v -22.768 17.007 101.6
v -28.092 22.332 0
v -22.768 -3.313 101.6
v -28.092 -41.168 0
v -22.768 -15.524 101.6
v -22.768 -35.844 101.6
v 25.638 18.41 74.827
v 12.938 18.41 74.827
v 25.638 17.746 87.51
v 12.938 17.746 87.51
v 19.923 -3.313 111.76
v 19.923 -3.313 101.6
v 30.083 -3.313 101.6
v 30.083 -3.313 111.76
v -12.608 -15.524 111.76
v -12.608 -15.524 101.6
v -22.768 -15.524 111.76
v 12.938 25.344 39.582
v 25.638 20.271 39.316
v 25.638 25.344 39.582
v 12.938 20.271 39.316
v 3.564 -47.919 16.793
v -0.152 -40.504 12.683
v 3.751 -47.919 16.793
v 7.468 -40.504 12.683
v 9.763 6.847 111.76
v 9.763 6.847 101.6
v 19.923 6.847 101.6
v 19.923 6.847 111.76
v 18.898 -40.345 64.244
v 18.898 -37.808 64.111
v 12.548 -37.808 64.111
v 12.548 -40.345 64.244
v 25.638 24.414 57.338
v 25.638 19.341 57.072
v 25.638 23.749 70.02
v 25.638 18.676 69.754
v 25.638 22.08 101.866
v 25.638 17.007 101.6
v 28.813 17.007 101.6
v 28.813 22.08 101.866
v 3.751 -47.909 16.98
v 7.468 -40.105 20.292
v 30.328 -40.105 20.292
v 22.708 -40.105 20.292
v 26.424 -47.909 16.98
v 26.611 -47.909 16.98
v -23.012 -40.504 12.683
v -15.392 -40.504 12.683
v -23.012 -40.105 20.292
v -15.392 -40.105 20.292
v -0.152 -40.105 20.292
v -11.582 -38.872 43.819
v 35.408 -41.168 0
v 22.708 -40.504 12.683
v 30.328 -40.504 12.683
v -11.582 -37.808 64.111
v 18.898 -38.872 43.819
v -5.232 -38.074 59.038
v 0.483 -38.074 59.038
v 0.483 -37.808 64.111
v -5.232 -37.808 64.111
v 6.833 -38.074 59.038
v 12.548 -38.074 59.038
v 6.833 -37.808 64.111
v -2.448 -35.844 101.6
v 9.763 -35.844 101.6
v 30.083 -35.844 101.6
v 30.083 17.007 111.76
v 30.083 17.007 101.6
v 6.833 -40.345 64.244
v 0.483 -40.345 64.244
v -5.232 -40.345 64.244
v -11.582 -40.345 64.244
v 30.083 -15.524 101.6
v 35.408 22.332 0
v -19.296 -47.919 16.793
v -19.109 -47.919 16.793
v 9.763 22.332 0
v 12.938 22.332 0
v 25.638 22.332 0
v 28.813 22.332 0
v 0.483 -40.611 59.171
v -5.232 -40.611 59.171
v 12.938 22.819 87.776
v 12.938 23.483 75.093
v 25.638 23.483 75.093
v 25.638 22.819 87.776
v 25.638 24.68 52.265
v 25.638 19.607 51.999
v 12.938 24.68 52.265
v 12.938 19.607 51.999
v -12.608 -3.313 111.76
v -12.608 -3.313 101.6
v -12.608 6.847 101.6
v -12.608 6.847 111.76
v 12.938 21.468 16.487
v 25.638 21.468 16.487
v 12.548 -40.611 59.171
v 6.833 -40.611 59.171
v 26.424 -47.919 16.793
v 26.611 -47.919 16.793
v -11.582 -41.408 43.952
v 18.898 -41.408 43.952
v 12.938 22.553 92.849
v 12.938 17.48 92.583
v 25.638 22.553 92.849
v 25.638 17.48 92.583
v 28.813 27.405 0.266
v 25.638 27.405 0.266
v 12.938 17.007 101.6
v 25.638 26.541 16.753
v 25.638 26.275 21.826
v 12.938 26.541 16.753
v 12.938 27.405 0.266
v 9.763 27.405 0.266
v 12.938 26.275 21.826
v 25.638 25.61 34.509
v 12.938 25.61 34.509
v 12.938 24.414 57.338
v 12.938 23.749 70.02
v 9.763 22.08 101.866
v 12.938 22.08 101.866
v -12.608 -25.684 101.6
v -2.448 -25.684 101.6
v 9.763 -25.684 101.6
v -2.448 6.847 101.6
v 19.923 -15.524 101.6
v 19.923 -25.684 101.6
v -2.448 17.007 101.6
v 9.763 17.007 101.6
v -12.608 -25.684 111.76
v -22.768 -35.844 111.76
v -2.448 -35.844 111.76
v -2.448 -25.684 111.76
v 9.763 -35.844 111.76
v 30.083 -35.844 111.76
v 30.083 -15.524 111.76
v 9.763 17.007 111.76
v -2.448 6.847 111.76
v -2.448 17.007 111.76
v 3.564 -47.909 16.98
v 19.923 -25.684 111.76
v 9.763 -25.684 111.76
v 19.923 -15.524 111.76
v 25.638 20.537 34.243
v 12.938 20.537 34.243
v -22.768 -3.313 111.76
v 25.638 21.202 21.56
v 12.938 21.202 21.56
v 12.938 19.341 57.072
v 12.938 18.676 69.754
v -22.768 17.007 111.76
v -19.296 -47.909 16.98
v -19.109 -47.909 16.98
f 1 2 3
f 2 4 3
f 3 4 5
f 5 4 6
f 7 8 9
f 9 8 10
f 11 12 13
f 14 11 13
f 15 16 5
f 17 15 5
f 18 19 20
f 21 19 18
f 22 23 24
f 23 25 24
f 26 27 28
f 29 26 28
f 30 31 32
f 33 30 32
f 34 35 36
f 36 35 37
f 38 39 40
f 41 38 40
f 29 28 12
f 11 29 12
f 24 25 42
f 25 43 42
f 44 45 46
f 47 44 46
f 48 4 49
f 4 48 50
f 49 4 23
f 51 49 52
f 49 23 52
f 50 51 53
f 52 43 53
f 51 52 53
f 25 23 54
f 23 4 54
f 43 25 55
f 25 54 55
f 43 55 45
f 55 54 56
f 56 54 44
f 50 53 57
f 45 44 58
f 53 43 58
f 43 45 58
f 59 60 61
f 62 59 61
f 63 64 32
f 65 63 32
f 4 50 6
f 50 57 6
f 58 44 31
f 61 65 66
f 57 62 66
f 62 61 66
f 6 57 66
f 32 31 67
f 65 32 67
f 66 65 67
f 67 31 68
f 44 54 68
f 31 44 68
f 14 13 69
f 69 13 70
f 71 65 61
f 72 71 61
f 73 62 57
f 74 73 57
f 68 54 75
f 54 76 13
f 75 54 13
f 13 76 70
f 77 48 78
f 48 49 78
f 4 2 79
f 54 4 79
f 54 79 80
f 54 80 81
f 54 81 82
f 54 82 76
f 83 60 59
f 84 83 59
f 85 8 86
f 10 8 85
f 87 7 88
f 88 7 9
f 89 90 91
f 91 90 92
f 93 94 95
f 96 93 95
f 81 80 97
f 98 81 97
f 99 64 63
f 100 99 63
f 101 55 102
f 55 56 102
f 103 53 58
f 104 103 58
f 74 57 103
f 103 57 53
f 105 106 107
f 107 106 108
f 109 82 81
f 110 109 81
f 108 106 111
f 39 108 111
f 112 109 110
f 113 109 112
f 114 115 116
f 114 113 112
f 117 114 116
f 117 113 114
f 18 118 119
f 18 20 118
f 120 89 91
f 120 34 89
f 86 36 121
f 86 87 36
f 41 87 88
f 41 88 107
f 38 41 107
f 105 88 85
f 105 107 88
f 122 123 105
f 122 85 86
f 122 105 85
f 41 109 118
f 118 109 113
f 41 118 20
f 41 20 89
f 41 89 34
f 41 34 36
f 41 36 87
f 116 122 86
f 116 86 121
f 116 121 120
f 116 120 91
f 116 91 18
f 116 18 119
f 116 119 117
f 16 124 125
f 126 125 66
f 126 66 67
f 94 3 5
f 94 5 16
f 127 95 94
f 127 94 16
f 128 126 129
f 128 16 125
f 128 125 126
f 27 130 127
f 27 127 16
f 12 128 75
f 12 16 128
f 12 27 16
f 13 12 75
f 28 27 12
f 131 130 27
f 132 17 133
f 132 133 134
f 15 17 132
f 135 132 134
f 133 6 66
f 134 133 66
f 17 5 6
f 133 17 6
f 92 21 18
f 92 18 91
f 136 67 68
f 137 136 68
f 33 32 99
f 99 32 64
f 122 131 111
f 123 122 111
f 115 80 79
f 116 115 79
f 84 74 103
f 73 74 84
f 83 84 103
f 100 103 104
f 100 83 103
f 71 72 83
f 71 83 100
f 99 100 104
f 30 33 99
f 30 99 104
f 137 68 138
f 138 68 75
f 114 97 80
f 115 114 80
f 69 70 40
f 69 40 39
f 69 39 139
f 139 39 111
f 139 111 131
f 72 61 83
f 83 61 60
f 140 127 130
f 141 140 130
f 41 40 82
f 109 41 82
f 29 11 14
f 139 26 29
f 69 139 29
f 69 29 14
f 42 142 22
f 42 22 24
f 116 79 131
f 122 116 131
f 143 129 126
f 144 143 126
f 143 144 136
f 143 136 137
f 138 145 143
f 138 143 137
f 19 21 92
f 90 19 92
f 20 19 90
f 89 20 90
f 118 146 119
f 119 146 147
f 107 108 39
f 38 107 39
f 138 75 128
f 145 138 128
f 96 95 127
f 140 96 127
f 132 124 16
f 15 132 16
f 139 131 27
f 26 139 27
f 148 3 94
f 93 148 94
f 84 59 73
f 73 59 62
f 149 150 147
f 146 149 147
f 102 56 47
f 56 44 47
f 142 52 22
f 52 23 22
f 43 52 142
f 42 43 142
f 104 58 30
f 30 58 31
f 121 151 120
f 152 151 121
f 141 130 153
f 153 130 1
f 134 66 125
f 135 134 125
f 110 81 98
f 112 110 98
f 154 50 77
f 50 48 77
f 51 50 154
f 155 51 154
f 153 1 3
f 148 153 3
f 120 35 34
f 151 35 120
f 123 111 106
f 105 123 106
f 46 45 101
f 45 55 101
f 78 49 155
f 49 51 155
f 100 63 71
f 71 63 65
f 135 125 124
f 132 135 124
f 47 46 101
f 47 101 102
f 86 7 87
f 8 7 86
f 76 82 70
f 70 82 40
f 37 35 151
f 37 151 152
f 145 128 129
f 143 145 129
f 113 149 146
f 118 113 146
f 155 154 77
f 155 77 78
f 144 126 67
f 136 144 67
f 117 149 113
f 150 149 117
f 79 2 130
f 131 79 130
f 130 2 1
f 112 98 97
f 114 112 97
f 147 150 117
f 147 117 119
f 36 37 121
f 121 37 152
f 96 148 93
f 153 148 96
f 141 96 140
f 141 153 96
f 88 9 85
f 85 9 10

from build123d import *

# Parameters (mm, degrees)
F0_W     = 63.5
F0_H     = 63.5
F1_DEPTH = 101.6
F1_TAPER = 3
F3_DEPTH = 10.16
F4_W     = 7.62
F4_H     = 7.62
F5_DEPTH = 7.62
F5_TAPER = 26
F7_DEPTH = 2.54
F8_W     = 12.7
F8_H     = 12.7
F9_DEPTH = 5.08


with BuildPart() as f1:
    # F0 (on Top) → F1 (new body)
    with BuildSketch(Plane.XY):
        with Locations((3.6575980484, -9.4182148212)):
            Rectangle(F0_W, F0_H)
    extrude(amount=F1_DEPTH, taper=F1_TAPER)

    # F2 (on face) → F3 (join)
    with BuildSketch(Plane.XY.offset(101.6)):
        Polygon((-12.6077715764, -15.5235844461), (-22.7677715764, -15.5235844461), (-22.7677715764, -35.8435844461), (-12.6077715764, -35.8435844461), (-2.4477715764, -35.8435844461), (-2.4477715764, -25.6835844461), (-12.6077715764, -25.6835844461), align=None)
        Polygon((19.9229676733, -35.8435844461), (30.0829676733, -35.8435844461), (30.0829676733, -15.5235844461), (19.9229676733, -15.5235844461), (19.9229676733, -25.6835844461), (9.7629676733, -25.6835844461), (9.7629676733, -35.8435844461), align=None)
        Polygon((-12.6077715764, 17.0071548036), (-22.7677715764, 17.0071548036), (-22.7677715764, -3.3128451964), (-12.6077715764, -3.3128451964), (-12.6077715764, 6.8471548036), (-2.4477715764, 6.8471548036), (-2.4477715764, 17.0071548036), align=None)
        Polygon((30.0829676733, -3.3128451964), (30.0829676733, 17.0071548036), (19.9229676733, 17.0071548036), (9.7629676733, 17.0071548036), (9.7629676733, 6.8471548036), (19.9229676733, 6.8471548036), (19.9229676733, -3.3128451964), align=None)
    extrude(amount=F3_DEPTH)

    # F4 (on face) → F5 (join)
    with BuildSketch(Plane(origin=(0, -41.0554529271, 2.1516251154), x_dir=(1, 0, 0), z_dir=(0, -0.9986295348, 0.0523359562))):
        with Locations((-19.2024019516, 14.3554221105)):
            Rectangle(F4_W, F4_H)
        with Locations((3.6575980484, 14.3554221105)):
            Rectangle(F4_W, F4_H)
        with Locations((26.5175980484, 14.3554221105)):
            Rectangle(F4_W, F4_H)
    extrude(amount=F5_DEPTH, taper=F5_TAPER)

    # F6 (on face) → F7 (join)
    with BuildSketch(Plane(origin=(0, -41.0554529271, 2.1516251154), x_dir=(1, 0, 0), z_dir=(0, -0.9986295348, 0.0523359562))):
        Polygon((-11.5824019516, 56.964216193), (-11.5824019516, 41.724216193), (18.8975980484, 41.724216193), (18.8975980484, 56.964216193), (18.8975980484, 62.044216193), (12.5475980484, 62.044216193), (12.5475980484, 56.964216193), (6.8325980484, 56.964216193), (6.8325980484, 62.044216193), (0.4825980484, 62.044216193), (0.4825980484, 56.964216193), (-5.2324019516, 56.964216193), (-5.2324019516, 62.044216193), (-11.5824019516, 62.044216193), align=None)
    extrude(amount=F7_DEPTH)

    # F8 (on face) → F9 (join)
    with BuildSketch(Plane(origin=(0, 22.2706172509, 1.1671535934), x_dir=(-1, 0, 0), z_dir=(0, 0.9986295348, 0.0523359562))):
        Polygon((-28.8129676733, 100.5706750214), (-28.8129676733, -1.1687553319), (-25.6379676733, -1.1687553319), (-25.6379676733, 15.3412446681), (-12.9379676733, 15.3412446681), (-12.9379676733, -1.1687553319), (-9.7629676733, -1.1687553319), (-9.7629676733, 100.5706750214), (-12.9379676733, 100.5706750214), (-12.9379676733, 91.5412446681), (-25.6379676733, 91.5412446681), (-25.6379676733, 100.5706750214), align=None)
        with Locations((-19.2879676733, 26.7712446681)):
            Rectangle(F8_W, F8_H, mode=Mode.SUBTRACT)
        with Locations((-19.2879676733, 44.5512446681)):
            Rectangle(F8_W, F8_H, mode=Mode.SUBTRACT)
        with Locations((-19.2879676733, 80.1112446681)):
            Rectangle(F8_W, F8_H, mode=Mode.SUBTRACT)
        with Locations((-19.2879676733, 62.3312446681)):
            Rectangle(F8_W, F8_H, mode=Mode.SUBTRACT)
    extrude(amount=F9_DEPTH)


solid = f1.part
